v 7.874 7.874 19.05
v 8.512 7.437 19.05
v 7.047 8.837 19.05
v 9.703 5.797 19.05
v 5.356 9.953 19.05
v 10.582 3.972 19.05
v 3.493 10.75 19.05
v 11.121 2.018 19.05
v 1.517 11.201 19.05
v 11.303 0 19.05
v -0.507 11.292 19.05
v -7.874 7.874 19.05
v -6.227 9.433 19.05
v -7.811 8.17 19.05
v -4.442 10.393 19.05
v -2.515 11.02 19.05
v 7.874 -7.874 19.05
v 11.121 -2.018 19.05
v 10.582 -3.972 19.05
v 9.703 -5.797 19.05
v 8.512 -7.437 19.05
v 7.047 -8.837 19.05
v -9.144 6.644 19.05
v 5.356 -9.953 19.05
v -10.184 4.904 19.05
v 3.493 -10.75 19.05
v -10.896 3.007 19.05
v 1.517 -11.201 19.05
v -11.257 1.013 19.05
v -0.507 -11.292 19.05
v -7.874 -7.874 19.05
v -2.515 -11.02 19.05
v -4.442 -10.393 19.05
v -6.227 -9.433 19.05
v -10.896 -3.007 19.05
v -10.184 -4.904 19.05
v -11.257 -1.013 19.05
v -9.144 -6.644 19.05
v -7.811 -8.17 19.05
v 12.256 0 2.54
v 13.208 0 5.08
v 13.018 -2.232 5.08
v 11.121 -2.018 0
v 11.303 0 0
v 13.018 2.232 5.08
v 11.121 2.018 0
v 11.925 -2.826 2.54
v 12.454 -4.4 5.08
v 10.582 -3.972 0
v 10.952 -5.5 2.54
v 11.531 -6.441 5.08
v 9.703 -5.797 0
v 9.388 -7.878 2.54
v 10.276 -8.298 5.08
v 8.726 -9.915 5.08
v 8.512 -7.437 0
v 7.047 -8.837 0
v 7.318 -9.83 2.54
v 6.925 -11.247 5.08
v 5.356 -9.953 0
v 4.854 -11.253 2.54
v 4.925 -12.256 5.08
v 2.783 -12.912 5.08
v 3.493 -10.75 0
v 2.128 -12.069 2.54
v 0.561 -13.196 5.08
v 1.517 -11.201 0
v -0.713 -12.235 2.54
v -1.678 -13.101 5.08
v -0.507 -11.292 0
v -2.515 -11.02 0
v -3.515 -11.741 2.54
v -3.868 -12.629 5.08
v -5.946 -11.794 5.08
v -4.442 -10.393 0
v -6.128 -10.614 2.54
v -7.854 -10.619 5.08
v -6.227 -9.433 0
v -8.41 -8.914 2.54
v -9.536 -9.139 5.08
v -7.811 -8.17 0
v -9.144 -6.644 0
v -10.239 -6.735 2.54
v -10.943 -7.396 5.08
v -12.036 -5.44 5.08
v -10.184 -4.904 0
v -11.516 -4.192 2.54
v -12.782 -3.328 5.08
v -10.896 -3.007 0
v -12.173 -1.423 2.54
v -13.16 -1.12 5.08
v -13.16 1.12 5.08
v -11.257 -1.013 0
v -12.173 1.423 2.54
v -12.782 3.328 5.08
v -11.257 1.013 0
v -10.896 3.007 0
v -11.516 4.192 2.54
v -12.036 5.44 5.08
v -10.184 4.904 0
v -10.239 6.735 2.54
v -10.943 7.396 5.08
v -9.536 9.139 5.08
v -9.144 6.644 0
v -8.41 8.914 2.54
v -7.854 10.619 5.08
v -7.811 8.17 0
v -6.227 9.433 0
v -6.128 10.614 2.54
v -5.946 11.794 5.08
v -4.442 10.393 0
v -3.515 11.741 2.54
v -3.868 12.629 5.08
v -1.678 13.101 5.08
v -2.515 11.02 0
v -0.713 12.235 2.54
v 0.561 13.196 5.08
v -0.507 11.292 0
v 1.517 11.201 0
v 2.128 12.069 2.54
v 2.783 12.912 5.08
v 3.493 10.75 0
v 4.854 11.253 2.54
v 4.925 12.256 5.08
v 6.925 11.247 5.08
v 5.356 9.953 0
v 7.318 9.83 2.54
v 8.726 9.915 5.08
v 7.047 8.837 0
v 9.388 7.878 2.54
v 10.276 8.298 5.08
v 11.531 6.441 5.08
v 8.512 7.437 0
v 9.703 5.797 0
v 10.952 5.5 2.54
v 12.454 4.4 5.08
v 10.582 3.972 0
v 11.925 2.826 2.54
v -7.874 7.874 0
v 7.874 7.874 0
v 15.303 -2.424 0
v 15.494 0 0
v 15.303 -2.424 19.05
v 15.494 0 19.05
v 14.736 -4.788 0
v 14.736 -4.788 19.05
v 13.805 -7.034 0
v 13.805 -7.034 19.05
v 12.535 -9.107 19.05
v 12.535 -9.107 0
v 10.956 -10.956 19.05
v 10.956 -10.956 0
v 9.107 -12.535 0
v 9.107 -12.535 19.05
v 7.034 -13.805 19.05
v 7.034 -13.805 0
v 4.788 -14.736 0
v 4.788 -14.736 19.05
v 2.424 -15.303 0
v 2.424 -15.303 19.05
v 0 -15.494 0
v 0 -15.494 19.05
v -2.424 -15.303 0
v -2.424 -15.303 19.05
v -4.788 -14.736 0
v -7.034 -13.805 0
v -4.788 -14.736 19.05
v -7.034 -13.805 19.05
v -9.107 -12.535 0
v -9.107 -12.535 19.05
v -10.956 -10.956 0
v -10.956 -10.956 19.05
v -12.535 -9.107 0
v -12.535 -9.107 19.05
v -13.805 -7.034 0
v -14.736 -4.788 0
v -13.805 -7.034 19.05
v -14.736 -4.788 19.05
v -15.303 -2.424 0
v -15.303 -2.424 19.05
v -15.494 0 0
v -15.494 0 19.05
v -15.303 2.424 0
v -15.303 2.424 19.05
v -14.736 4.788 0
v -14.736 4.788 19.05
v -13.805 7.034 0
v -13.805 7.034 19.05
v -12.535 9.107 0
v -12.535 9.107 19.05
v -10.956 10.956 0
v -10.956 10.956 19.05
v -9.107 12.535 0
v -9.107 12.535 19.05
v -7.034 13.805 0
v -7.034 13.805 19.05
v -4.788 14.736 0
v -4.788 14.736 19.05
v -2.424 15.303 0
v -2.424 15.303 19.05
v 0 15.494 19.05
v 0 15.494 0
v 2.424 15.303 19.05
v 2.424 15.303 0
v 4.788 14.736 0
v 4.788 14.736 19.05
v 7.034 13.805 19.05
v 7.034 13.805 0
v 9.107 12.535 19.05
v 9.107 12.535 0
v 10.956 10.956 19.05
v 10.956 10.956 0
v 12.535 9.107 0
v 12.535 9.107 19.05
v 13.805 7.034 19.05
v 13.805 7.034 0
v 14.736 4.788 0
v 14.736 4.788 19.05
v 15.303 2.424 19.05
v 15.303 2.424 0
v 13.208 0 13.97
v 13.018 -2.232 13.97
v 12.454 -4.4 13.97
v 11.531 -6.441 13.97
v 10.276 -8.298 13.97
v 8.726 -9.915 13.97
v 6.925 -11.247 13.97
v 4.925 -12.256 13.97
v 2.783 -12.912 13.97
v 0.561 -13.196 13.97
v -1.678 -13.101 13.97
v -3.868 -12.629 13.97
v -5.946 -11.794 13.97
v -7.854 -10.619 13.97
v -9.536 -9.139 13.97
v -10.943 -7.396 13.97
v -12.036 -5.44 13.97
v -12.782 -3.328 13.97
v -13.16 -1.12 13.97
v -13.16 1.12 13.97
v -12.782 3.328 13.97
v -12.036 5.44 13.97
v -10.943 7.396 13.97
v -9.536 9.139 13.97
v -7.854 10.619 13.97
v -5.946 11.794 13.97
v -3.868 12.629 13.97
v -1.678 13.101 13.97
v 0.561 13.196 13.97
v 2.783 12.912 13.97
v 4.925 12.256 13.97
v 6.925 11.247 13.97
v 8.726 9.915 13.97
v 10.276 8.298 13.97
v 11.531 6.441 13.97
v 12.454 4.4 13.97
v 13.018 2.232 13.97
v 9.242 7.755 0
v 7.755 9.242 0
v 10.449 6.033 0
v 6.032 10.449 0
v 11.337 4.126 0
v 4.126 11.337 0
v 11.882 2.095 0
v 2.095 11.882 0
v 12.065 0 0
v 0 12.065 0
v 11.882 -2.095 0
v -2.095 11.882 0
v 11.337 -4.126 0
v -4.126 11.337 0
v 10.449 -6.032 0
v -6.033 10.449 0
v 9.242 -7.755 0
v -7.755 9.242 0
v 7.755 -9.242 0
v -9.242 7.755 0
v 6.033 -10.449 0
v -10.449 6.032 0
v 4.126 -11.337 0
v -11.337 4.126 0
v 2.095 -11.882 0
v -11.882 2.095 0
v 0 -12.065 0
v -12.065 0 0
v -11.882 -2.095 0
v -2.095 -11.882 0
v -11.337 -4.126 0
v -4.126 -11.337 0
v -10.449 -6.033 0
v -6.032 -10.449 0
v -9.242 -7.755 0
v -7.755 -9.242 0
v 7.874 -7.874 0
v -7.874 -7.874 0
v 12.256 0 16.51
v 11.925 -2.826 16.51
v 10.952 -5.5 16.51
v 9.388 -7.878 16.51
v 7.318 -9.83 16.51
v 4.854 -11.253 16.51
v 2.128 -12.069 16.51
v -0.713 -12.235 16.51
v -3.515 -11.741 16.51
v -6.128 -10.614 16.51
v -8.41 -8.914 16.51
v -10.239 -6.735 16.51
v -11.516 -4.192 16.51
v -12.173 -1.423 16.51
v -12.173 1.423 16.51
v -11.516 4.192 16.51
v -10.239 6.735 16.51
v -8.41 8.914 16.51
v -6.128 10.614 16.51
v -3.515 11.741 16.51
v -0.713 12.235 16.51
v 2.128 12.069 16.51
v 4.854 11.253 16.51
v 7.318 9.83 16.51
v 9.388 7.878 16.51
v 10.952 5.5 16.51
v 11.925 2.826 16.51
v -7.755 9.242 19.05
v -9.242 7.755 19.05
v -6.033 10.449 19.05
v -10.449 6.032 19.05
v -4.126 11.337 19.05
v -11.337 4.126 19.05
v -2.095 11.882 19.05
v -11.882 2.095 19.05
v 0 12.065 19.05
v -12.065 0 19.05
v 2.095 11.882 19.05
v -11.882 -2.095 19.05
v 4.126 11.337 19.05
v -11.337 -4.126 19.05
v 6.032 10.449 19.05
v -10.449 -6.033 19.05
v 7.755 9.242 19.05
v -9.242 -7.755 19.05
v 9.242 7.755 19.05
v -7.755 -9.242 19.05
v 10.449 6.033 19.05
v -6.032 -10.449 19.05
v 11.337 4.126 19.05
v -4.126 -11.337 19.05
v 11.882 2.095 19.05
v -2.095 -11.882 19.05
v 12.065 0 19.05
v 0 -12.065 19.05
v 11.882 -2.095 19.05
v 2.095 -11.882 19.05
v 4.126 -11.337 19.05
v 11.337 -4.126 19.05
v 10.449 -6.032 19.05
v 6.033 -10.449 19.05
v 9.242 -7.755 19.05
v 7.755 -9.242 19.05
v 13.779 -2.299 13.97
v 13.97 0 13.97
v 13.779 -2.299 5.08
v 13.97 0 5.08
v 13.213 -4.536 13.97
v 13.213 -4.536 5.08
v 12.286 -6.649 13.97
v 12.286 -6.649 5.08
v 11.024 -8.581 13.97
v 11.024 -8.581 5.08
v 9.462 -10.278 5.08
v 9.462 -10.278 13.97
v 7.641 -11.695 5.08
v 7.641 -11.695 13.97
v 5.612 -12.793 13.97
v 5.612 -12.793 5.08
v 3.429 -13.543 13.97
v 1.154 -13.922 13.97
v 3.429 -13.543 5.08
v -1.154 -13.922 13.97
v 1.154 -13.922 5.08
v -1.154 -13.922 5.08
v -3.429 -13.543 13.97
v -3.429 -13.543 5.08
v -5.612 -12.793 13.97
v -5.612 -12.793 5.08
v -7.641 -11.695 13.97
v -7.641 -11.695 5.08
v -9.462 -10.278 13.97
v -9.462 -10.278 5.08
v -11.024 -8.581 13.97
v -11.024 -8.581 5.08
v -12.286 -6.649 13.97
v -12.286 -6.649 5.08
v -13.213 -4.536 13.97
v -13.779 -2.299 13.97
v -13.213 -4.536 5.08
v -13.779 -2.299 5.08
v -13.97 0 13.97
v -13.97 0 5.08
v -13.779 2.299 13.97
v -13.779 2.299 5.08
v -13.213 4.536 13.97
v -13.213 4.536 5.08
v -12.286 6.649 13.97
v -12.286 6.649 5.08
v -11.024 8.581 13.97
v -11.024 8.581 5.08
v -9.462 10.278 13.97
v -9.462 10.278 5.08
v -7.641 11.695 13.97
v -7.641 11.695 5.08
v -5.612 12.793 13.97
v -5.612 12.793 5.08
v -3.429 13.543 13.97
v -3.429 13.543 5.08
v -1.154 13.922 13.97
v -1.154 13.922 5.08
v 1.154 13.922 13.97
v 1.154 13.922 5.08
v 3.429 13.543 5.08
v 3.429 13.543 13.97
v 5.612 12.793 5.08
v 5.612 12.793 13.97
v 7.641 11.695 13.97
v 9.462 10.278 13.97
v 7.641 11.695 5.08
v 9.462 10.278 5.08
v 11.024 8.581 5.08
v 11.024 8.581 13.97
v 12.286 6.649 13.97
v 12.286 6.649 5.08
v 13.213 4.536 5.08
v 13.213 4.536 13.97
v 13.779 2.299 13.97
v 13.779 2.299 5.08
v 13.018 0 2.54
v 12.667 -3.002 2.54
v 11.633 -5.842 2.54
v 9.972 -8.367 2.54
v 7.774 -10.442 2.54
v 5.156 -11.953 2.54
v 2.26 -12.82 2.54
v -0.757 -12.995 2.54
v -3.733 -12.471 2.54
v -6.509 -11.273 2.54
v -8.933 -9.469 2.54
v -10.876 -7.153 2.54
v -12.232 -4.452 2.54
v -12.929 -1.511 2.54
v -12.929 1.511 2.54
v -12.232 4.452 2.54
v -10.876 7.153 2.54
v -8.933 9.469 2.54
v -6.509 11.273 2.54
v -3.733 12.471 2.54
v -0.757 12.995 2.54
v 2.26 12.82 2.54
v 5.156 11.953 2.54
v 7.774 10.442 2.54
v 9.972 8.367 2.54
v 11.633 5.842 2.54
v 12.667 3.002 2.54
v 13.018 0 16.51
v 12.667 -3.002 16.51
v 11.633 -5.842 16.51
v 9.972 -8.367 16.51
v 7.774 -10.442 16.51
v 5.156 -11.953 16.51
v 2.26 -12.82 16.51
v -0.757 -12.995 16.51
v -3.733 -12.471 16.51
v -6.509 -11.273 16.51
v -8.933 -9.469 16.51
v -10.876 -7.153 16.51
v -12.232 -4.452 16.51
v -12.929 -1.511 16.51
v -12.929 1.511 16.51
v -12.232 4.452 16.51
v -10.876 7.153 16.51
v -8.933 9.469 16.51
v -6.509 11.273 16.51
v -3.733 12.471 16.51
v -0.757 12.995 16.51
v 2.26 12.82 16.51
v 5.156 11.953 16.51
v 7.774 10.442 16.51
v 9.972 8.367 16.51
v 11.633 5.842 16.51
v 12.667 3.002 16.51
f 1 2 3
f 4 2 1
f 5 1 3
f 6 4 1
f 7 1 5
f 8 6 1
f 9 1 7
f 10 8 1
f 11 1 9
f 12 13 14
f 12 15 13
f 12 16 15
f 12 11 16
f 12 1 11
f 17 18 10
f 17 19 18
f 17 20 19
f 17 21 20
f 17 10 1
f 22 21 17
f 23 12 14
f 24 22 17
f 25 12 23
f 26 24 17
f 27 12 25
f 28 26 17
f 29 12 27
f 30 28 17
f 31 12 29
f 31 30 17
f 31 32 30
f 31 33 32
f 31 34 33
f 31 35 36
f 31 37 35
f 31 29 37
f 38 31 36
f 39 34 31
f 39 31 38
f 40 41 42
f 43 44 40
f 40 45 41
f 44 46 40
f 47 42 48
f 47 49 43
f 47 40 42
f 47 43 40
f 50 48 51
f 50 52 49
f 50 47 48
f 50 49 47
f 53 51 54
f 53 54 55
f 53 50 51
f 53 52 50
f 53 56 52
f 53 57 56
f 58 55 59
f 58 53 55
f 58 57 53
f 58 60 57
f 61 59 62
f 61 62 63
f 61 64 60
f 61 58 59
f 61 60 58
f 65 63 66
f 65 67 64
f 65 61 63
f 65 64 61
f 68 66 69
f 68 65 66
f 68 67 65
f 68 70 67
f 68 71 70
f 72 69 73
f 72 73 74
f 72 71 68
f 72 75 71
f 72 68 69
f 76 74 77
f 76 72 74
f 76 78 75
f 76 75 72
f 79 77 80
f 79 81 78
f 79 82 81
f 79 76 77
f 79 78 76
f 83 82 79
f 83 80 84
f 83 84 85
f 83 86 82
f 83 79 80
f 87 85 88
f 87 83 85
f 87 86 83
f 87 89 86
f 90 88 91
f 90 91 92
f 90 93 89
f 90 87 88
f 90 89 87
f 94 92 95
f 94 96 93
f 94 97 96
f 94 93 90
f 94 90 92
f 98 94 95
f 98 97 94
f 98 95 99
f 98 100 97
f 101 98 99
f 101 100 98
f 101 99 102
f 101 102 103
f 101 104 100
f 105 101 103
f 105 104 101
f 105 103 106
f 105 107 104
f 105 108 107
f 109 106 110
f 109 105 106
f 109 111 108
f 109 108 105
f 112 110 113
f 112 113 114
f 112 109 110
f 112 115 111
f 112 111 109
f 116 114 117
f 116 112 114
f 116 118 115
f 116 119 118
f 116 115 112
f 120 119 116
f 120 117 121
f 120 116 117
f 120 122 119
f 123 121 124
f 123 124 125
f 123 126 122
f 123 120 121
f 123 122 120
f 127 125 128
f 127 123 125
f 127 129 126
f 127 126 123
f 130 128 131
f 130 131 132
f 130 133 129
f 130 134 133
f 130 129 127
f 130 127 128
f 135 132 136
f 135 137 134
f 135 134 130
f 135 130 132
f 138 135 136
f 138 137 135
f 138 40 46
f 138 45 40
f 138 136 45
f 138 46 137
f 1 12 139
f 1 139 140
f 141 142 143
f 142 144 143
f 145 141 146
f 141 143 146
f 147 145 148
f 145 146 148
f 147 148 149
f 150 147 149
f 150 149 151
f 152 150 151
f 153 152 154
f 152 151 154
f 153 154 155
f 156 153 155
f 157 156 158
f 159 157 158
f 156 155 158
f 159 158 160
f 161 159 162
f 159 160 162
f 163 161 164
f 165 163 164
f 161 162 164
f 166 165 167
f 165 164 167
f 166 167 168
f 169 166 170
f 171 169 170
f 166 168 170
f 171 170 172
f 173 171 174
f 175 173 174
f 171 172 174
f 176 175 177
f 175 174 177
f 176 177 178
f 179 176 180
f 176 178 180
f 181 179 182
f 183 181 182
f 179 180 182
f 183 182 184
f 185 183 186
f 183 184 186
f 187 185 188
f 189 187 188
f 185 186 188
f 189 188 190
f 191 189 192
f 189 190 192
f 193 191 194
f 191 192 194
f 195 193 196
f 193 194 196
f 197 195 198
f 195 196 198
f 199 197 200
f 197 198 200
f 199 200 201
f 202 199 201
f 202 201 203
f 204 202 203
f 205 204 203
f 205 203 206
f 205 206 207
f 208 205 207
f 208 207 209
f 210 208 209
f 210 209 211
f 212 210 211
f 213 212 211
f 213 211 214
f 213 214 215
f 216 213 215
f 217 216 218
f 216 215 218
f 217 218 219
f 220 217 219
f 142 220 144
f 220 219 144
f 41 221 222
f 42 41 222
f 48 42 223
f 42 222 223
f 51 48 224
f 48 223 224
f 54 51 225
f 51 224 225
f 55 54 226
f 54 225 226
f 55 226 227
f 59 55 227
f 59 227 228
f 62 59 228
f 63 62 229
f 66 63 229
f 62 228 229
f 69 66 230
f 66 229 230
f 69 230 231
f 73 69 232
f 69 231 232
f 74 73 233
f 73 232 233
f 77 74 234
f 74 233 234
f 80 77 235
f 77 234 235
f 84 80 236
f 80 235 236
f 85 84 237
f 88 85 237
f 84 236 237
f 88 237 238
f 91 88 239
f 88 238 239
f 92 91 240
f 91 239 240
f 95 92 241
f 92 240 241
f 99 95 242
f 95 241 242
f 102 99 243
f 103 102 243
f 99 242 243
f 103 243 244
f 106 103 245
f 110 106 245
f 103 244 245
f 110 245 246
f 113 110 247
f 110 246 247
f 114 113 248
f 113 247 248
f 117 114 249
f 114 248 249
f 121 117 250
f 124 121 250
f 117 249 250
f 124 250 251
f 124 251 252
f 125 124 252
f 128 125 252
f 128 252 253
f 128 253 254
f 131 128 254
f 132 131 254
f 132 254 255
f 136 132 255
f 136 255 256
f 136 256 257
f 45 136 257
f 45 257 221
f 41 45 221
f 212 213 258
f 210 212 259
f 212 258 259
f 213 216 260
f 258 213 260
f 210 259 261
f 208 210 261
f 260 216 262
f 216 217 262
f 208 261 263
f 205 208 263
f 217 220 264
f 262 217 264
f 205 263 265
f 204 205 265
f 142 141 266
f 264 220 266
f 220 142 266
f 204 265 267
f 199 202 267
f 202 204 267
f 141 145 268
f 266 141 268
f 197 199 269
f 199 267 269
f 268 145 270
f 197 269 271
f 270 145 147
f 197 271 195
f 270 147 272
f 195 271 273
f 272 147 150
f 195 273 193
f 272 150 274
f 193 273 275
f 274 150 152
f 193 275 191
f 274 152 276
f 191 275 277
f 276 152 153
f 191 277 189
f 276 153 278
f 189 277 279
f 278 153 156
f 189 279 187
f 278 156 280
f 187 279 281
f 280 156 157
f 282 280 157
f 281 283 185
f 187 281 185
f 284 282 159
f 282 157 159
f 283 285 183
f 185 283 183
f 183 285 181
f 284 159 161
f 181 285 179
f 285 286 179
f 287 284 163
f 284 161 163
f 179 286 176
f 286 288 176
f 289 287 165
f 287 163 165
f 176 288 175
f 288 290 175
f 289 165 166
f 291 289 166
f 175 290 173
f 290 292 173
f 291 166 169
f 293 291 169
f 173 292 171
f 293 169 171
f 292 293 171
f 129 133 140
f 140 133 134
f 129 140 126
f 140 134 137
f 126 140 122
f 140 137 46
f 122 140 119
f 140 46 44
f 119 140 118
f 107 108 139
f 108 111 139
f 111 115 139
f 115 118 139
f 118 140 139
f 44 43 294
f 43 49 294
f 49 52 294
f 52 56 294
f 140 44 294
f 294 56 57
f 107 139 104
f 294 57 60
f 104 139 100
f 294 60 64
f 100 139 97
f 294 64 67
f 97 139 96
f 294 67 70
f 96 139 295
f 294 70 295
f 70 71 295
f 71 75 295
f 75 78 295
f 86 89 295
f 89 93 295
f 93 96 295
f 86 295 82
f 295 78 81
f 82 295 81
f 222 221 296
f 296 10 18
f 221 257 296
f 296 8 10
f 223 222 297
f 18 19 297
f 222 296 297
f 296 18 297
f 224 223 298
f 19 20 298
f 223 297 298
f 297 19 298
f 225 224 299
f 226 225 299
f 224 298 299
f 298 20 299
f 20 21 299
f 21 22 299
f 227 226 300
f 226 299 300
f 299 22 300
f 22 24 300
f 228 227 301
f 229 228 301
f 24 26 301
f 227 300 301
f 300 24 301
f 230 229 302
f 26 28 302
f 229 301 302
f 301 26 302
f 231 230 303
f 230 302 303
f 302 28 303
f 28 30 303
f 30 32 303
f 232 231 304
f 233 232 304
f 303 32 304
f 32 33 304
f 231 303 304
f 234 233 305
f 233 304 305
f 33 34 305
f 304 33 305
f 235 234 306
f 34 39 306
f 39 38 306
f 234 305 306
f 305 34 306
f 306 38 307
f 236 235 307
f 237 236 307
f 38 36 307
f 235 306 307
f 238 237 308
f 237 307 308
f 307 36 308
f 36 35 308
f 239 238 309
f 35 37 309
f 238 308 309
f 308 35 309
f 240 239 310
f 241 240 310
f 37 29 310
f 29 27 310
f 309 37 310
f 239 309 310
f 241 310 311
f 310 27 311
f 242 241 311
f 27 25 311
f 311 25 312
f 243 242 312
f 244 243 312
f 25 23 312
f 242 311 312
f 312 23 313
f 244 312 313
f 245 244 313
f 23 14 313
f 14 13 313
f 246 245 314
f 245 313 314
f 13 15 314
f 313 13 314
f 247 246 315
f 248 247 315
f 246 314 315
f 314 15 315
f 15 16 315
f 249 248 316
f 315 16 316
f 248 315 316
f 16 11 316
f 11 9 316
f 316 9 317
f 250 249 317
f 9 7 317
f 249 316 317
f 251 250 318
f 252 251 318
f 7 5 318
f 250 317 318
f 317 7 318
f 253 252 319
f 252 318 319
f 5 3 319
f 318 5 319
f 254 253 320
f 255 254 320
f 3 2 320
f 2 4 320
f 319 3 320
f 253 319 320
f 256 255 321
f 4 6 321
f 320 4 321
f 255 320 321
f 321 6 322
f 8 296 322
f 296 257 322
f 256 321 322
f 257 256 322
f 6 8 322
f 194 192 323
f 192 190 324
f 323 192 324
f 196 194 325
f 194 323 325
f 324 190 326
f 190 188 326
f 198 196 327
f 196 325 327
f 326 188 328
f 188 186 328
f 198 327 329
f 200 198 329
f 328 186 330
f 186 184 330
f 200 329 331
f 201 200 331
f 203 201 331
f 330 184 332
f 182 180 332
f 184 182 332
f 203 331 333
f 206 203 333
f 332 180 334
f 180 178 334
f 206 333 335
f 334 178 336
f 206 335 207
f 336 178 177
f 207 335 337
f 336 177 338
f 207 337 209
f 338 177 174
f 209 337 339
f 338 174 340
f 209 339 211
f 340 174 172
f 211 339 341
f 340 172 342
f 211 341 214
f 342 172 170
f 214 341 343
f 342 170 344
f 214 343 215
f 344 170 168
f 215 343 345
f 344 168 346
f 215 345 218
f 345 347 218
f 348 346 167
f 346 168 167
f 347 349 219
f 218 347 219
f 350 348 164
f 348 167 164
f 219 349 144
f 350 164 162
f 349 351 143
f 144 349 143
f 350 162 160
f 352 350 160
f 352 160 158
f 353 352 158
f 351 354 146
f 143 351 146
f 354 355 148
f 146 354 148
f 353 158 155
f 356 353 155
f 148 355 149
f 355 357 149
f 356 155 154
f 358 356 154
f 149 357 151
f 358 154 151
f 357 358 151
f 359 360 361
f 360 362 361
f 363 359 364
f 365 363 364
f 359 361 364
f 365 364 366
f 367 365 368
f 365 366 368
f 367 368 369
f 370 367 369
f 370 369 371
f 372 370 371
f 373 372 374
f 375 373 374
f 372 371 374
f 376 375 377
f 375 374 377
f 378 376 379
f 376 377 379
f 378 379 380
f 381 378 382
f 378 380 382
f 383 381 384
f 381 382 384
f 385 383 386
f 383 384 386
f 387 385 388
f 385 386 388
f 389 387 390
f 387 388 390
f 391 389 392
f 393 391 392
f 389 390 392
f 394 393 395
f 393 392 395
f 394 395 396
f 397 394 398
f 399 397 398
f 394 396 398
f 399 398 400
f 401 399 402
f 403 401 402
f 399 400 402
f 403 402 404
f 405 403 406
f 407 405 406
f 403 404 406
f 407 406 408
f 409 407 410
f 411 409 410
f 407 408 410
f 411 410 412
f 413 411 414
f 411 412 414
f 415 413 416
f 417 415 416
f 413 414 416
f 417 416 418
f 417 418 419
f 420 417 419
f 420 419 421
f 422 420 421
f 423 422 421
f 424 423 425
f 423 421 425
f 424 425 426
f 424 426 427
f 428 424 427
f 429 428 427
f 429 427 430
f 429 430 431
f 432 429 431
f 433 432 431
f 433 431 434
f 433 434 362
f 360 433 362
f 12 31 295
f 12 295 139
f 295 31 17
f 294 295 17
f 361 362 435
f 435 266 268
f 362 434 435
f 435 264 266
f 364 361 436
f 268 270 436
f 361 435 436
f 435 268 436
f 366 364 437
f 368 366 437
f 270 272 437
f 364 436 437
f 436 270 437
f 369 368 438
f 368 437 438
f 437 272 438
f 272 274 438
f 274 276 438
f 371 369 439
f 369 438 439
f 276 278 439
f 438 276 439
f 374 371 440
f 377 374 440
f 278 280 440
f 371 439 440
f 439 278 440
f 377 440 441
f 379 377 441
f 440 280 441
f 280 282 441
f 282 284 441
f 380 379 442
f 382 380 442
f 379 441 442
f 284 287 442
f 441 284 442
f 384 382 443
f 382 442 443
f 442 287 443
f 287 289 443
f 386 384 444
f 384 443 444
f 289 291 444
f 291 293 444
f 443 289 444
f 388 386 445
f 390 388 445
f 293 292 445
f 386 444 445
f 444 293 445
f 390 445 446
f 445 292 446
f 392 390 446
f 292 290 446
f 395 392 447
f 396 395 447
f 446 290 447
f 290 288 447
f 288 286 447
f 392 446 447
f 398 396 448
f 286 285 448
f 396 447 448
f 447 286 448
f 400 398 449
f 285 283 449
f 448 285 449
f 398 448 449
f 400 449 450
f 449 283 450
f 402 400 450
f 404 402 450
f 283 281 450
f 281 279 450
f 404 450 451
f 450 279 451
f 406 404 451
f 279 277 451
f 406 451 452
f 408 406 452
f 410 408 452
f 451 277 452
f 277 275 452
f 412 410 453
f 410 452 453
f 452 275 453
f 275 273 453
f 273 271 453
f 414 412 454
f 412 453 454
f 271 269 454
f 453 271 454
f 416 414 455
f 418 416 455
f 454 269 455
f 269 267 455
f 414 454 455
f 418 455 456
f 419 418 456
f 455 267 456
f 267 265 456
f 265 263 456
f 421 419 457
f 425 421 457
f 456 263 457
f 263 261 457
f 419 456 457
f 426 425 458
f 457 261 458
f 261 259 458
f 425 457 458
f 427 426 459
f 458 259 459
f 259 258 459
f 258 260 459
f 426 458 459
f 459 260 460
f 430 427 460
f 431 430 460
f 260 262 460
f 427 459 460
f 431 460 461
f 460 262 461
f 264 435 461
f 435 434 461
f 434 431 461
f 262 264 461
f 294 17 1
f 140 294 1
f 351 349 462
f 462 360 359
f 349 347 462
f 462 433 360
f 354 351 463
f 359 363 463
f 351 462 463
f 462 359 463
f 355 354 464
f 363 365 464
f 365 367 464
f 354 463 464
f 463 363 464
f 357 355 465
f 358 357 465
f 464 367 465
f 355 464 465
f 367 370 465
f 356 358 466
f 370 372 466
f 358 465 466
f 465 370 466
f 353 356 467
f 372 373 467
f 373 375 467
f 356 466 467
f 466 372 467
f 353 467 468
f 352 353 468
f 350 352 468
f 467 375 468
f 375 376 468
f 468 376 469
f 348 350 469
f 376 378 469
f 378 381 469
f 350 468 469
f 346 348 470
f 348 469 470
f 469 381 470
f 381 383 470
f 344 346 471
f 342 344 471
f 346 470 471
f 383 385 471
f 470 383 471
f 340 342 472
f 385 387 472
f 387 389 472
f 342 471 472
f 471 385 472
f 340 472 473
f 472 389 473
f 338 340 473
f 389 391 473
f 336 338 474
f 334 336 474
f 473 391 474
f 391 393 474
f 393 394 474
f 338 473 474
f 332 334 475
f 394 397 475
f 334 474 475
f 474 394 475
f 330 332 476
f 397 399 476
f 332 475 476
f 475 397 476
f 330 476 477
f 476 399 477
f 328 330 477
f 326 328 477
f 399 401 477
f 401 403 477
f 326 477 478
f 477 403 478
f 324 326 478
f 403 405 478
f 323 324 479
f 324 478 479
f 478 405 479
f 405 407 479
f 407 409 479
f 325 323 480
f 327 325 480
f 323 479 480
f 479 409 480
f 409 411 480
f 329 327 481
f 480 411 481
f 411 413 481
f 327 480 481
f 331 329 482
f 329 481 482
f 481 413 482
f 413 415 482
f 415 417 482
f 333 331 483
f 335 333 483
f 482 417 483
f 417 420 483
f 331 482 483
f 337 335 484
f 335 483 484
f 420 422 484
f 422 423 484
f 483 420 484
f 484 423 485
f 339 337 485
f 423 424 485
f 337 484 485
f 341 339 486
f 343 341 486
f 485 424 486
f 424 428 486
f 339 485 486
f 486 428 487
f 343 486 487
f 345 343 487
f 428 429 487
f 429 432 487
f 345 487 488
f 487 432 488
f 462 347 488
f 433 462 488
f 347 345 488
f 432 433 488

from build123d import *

# Parameters (mm, degrees)
F0_W     = 13.208
F0_H     = 19.05
F2_W     = 15.748
F2_H     = 15.748
F3_DEPTH = 19.051
F4_SIZE2 = 1.905
F4_SIZE  = 5.08


with BuildPart() as f1:
    # F0 (on Front) → F1 (revolve)
    with BuildSketch(Plane.XZ):
        with Locations((6.604, 9.525)):
            Rectangle(F0_W, F0_H)
    revolve(axis=Axis((0, 0, -10.8857148167), (0, 0, -1)))

    # F2 (on face) → F3 (cut, through all)
    with BuildSketch(Plane.XY.offset(19.05)):
        Rectangle(F2_W, F2_H)
    extrude(amount=-F3_DEPTH, mode=Mode.SUBTRACT)

    # F4
    f4_edges = [f1.edges().sort_by_distance(p)[0] for p in [
        (-13.208, 0, 19.05),
        (-13.208, 0, 0),
    ]]
    f4_side = f1.faces().sort_by_distance((-13.208, 0, 9.525))[0]
    chamfer(f4_edges, length=F4_SIZE, length2=F4_SIZE2, reference=f4_side)


with BuildPart() as f6:
    # F5 (on Front) → F6 (revolve)
    with BuildSketch(Plane.XZ):
        Polygon((15.494, 19.05), (12.065, 19.05), (13.97, 13.97), (13.97, 5.08), (12.065, 0), (13.208, 0), (15.494, 0), align=None)
    revolve(axis=Axis((0, 0, -10.8857148167), (0, 0, -1)))


solid = Compound([f1.part, f6.part])
